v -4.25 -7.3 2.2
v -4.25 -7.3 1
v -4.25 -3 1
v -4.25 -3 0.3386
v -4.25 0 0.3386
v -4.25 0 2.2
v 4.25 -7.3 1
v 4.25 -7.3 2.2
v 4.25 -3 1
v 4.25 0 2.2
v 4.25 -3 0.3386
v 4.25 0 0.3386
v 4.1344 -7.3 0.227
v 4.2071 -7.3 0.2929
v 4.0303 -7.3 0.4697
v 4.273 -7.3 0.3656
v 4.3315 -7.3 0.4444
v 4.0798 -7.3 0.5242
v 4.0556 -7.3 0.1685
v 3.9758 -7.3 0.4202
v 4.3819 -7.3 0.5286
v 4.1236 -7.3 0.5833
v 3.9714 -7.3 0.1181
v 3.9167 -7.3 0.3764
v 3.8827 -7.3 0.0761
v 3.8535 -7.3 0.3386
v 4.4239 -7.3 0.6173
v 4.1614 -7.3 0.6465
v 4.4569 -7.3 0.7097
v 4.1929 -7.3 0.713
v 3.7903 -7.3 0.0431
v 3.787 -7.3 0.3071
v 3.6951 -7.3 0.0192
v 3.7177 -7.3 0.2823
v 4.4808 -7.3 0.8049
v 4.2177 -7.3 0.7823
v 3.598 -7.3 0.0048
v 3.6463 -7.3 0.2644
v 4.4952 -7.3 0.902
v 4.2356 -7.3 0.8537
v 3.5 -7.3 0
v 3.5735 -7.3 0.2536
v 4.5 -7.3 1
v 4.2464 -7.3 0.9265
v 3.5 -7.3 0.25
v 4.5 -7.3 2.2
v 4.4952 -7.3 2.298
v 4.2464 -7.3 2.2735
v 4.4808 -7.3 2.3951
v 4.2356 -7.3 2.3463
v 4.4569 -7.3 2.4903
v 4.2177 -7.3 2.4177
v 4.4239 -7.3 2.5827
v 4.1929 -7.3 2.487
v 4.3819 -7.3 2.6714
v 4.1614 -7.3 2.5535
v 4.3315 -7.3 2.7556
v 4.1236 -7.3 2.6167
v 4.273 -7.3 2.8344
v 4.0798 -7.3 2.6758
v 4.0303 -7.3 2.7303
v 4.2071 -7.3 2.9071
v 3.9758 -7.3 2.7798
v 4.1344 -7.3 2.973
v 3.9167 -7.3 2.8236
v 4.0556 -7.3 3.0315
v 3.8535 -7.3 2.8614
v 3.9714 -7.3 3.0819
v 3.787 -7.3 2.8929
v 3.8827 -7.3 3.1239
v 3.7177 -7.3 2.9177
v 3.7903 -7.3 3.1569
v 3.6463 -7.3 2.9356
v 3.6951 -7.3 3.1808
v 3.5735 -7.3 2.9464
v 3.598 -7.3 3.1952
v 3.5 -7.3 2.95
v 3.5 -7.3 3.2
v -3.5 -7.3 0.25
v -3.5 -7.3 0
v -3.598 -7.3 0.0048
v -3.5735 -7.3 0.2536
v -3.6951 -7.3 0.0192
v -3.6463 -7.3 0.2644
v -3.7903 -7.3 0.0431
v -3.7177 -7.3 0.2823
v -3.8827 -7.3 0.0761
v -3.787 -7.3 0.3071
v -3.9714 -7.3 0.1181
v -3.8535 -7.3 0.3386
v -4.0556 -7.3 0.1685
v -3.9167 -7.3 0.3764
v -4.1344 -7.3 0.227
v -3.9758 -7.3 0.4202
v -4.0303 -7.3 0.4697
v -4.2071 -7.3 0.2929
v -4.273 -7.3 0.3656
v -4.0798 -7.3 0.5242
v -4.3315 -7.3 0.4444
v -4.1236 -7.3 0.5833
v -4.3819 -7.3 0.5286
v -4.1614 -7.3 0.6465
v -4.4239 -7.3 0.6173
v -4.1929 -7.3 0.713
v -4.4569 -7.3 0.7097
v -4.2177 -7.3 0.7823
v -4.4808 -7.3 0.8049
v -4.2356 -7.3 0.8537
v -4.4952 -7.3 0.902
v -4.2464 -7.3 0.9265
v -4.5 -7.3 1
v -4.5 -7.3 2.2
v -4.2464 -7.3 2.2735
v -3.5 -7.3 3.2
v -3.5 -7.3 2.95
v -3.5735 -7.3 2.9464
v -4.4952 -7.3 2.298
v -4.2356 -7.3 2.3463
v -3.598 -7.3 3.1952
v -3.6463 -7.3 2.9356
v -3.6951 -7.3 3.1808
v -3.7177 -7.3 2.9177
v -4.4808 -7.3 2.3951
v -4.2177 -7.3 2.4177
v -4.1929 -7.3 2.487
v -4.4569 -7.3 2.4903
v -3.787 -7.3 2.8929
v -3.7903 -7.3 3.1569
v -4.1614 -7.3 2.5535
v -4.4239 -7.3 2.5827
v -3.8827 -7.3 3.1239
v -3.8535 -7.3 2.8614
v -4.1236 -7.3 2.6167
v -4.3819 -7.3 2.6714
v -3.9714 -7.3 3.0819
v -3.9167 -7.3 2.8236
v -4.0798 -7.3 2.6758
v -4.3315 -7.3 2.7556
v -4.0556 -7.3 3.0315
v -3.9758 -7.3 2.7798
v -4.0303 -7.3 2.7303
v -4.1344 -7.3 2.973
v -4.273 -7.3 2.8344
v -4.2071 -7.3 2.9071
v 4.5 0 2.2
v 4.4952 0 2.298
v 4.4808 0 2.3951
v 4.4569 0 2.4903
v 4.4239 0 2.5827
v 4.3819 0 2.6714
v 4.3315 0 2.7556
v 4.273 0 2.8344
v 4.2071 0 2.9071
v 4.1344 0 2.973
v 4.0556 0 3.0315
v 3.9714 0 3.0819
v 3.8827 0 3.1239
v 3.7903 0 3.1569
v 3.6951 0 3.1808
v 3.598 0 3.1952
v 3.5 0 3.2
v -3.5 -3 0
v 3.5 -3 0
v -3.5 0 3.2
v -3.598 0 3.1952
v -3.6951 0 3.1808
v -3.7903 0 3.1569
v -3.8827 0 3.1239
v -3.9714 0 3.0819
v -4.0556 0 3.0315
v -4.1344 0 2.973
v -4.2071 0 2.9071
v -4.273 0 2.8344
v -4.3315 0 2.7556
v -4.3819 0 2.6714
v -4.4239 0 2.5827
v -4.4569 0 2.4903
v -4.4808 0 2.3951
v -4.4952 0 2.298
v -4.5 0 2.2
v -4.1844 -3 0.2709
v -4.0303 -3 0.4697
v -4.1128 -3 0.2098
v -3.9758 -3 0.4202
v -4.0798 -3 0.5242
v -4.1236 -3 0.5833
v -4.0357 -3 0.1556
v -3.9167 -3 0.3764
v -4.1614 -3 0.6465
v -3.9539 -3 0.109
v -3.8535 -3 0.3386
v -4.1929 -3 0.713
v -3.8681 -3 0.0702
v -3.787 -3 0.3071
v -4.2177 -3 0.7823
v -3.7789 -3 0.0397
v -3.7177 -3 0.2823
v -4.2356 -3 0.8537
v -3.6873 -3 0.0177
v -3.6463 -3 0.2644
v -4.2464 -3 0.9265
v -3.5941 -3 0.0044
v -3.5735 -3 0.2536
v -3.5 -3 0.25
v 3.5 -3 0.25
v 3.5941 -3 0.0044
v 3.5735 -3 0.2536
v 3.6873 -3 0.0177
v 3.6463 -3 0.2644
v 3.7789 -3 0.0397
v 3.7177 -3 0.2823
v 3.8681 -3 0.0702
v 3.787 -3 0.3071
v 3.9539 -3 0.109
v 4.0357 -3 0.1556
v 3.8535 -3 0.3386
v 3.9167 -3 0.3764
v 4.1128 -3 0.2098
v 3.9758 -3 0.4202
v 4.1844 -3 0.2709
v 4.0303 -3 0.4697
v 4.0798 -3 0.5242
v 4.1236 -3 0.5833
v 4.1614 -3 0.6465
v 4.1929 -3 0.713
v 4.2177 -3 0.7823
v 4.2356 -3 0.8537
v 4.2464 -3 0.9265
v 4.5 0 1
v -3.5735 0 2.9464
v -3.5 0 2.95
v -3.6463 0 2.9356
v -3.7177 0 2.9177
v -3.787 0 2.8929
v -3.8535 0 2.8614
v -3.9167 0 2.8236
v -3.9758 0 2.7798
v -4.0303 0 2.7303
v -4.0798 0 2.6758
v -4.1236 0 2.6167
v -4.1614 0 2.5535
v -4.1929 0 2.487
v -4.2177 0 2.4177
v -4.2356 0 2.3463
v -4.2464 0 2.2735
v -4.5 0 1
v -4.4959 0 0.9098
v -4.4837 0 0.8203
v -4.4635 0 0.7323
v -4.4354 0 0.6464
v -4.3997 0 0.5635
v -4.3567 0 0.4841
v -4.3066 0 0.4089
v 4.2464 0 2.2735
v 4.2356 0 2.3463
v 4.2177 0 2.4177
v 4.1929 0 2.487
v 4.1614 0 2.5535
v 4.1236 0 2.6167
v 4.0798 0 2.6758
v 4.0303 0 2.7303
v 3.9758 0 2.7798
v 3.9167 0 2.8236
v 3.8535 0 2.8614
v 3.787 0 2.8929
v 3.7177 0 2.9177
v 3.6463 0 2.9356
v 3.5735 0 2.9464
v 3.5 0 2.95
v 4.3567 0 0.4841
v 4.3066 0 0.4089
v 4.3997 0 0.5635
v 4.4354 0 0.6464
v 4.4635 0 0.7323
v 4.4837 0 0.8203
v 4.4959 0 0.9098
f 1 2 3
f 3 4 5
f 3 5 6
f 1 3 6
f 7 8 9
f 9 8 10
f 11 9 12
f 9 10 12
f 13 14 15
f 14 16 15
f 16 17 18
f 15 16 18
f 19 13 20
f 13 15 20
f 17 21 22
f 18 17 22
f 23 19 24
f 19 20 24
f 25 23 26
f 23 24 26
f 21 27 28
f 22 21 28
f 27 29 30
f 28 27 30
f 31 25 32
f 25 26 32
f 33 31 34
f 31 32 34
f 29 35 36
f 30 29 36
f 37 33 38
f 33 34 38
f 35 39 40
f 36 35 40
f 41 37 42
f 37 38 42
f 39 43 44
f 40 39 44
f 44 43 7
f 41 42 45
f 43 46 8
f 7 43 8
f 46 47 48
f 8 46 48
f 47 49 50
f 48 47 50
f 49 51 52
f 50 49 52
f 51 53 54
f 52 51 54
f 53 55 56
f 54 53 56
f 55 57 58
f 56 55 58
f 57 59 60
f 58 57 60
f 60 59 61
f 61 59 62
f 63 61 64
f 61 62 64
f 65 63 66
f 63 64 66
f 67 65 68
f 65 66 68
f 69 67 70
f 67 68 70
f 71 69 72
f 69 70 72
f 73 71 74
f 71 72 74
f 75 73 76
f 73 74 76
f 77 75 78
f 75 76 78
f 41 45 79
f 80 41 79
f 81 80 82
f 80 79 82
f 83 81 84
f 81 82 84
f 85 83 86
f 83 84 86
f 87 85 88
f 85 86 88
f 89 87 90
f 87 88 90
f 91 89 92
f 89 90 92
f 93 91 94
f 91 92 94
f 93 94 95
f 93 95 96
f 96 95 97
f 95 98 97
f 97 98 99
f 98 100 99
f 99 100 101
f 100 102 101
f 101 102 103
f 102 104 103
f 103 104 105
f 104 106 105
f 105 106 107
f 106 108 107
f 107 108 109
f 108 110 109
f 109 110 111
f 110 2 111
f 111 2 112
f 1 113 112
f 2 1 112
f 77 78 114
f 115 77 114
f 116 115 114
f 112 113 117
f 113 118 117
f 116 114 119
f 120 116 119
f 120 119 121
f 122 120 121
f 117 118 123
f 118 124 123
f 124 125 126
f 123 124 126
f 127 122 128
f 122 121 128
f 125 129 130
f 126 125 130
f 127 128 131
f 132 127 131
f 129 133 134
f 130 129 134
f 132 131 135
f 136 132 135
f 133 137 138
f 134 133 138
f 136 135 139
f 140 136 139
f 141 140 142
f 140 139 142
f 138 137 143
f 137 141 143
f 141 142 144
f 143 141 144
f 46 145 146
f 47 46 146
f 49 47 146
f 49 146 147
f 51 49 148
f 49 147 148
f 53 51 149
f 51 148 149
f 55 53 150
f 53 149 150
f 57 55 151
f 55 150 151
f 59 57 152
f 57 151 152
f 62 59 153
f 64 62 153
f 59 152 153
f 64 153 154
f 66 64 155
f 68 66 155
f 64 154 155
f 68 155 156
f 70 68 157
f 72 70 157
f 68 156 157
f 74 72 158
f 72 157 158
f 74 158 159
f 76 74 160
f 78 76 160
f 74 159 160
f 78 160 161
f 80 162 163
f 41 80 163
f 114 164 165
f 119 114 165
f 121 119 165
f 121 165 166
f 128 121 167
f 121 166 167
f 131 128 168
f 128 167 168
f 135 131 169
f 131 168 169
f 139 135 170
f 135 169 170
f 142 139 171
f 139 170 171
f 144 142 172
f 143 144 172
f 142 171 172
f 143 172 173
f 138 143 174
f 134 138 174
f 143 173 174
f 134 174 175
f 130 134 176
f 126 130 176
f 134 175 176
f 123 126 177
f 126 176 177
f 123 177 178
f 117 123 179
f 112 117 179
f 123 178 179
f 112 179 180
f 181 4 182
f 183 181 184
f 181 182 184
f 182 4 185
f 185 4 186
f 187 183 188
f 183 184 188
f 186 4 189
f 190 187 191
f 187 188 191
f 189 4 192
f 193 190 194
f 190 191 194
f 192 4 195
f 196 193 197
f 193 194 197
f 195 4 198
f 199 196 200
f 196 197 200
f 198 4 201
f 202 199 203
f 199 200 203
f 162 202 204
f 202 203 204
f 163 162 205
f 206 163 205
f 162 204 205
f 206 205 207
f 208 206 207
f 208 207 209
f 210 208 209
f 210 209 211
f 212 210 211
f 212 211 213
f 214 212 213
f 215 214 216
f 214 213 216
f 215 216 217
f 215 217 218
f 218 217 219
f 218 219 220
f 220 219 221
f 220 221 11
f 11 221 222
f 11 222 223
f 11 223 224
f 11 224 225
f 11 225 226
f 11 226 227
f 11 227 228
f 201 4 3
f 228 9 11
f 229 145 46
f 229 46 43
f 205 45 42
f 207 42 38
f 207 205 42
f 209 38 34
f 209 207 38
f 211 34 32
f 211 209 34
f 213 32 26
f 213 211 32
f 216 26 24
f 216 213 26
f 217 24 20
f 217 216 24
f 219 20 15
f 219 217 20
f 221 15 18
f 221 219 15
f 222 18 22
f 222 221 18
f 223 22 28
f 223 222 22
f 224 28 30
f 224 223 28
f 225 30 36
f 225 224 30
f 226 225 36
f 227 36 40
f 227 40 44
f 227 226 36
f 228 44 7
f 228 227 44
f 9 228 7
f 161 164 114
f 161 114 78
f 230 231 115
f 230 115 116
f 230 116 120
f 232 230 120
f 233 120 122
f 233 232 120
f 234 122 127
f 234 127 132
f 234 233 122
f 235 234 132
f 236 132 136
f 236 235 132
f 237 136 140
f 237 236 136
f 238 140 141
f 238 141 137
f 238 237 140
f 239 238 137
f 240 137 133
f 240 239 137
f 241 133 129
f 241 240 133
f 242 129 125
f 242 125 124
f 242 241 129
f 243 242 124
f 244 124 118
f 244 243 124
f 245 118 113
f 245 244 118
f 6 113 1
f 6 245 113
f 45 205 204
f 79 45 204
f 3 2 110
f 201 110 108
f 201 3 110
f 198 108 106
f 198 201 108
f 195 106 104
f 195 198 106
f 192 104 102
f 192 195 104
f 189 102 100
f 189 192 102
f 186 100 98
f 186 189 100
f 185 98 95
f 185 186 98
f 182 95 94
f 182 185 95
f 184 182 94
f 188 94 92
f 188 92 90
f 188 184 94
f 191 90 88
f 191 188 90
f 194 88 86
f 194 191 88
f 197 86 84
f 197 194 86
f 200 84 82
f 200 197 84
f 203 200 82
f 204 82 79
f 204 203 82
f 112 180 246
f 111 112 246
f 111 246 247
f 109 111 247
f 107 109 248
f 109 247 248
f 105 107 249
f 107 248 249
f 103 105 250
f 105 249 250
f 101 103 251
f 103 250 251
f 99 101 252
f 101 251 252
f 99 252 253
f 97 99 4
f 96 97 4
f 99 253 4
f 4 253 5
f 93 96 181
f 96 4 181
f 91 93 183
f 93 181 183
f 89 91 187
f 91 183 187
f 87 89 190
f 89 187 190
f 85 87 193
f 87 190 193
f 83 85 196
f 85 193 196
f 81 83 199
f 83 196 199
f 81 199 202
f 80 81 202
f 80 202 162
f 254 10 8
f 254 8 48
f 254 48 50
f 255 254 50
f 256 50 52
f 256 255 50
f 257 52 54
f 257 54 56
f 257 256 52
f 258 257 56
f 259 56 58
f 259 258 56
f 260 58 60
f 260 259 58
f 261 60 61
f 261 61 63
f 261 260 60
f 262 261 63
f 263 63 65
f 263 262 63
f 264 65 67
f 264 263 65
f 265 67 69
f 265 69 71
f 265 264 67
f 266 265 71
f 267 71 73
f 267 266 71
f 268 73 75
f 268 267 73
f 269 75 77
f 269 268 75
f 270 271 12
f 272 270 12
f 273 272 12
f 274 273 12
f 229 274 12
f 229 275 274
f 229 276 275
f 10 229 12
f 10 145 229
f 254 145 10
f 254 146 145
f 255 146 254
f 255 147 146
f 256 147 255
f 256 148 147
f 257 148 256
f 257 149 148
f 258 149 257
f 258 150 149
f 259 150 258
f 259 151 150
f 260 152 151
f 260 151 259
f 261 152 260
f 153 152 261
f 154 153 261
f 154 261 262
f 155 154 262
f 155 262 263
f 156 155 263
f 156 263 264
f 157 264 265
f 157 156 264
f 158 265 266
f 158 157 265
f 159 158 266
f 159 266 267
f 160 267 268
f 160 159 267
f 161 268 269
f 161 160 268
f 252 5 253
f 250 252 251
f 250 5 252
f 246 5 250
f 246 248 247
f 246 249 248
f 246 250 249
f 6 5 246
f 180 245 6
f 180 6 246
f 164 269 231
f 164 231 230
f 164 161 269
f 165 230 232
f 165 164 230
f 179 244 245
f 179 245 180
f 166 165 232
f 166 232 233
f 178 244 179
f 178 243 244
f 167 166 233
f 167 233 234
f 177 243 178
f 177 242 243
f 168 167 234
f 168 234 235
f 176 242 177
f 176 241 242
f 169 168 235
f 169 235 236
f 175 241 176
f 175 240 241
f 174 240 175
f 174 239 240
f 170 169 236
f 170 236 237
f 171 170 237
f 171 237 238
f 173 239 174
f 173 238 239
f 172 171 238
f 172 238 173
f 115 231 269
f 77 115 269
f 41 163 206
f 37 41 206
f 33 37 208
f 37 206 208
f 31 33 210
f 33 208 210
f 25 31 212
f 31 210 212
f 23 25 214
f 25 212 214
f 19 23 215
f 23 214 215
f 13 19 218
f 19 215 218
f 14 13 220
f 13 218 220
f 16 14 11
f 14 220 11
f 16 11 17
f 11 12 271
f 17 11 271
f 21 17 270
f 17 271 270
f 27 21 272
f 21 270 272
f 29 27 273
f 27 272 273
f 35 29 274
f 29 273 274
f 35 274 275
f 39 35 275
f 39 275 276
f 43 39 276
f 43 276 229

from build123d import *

# Parameters (mm, degrees)
BOX067_W               = 8.5
BOX067_H               = 2.95
BOX067_DEPTH           = 3
FILLET011_R            = 0.75
EXTRUDE016_DEPTH       = 7.3
CUT016_PLACEMENT_ANGLE = 90


with BuildPart() as clone037:
    # Box067 → Box067 (new body)
    with BuildSketch(Plane(origin=(-4.25, 0, 0), x_dir=(1, 0, 0), z_dir=(0, 0, 1))):
        with Locations((4.25, 1.475)):
            Rectangle(BOX067_W, BOX067_H)
    extrude(amount=BOX067_DEPTH)

    # Fillet011
    fillet011_edges = [clone037.edges().sort_by_distance(p)[0] for p in [
        (-4.25, 2.95, 1.5),
        (4.25, 2.95, 1.5),
    ]]
    fillet(fillet011_edges, radius=FILLET011_R)


with BuildPart() as shield:
    # Sketch017 → Extrude016 (new body)
    with BuildSketch(Plane.XY):
        with BuildLine():
            Line((-3.5, 3.2), (3.5, 3.2))
            ThreePointArc((4.5, 2.2), (4.207107, 2.907107), (3.5, 3.2))
            Line((4.5, 2.2), (4.5, 1))
            ThreePointArc((3.5, 0), (4.207107, 0.292893), (4.5, 1))
            Line((-3.5, 0), (3.5, 0))
            ThreePointArc((-4.5, 1), (-4.207107, 0.292893), (-3.5, 0))
            Line((-4.5, 2.2), (-4.5, 1))
            ThreePointArc((-3.5, 3.2), (-4.207107, 2.907107), (-4.5, 2.2))
        make_face()
        with BuildLine():
            Line((-3.5, 2.95), (3.5, 2.95))
            ThreePointArc((4.25, 2.2), (4.03033, 2.73033), (3.5, 2.95))
            Line((4.25, 2.2), (4.25, 1))
            ThreePointArc((3.5, 0.25), (4.03033, 0.46967), (4.25, 1))
            Line((3.5, 0.25), (-3.5, 0.25))
            ThreePointArc((-4.25, 1), (-4.03033, 0.46967), (-3.5, 0.25))
            Line((-4.25, 1), (-4.25, 2.2))
            ThreePointArc((-3.5, 2.95), (-4.03033, 2.73033), (-4.25, 2.2))
        make_face(mode=Mode.SUBTRACT)
    extrude(amount=EXTRUDE016_DEPTH)

    # Cut016: cut Clone037
    add(clone037.part, mode=Mode.SUBTRACT)


with BuildPart() as shield_1:
    # Cut016 placement: moved
    add(shield.part.rotate(Axis((0, 0, 0), (1, 0, 0)), CUT016_PLACEMENT_ANGLE))


solid = shield_1.part
